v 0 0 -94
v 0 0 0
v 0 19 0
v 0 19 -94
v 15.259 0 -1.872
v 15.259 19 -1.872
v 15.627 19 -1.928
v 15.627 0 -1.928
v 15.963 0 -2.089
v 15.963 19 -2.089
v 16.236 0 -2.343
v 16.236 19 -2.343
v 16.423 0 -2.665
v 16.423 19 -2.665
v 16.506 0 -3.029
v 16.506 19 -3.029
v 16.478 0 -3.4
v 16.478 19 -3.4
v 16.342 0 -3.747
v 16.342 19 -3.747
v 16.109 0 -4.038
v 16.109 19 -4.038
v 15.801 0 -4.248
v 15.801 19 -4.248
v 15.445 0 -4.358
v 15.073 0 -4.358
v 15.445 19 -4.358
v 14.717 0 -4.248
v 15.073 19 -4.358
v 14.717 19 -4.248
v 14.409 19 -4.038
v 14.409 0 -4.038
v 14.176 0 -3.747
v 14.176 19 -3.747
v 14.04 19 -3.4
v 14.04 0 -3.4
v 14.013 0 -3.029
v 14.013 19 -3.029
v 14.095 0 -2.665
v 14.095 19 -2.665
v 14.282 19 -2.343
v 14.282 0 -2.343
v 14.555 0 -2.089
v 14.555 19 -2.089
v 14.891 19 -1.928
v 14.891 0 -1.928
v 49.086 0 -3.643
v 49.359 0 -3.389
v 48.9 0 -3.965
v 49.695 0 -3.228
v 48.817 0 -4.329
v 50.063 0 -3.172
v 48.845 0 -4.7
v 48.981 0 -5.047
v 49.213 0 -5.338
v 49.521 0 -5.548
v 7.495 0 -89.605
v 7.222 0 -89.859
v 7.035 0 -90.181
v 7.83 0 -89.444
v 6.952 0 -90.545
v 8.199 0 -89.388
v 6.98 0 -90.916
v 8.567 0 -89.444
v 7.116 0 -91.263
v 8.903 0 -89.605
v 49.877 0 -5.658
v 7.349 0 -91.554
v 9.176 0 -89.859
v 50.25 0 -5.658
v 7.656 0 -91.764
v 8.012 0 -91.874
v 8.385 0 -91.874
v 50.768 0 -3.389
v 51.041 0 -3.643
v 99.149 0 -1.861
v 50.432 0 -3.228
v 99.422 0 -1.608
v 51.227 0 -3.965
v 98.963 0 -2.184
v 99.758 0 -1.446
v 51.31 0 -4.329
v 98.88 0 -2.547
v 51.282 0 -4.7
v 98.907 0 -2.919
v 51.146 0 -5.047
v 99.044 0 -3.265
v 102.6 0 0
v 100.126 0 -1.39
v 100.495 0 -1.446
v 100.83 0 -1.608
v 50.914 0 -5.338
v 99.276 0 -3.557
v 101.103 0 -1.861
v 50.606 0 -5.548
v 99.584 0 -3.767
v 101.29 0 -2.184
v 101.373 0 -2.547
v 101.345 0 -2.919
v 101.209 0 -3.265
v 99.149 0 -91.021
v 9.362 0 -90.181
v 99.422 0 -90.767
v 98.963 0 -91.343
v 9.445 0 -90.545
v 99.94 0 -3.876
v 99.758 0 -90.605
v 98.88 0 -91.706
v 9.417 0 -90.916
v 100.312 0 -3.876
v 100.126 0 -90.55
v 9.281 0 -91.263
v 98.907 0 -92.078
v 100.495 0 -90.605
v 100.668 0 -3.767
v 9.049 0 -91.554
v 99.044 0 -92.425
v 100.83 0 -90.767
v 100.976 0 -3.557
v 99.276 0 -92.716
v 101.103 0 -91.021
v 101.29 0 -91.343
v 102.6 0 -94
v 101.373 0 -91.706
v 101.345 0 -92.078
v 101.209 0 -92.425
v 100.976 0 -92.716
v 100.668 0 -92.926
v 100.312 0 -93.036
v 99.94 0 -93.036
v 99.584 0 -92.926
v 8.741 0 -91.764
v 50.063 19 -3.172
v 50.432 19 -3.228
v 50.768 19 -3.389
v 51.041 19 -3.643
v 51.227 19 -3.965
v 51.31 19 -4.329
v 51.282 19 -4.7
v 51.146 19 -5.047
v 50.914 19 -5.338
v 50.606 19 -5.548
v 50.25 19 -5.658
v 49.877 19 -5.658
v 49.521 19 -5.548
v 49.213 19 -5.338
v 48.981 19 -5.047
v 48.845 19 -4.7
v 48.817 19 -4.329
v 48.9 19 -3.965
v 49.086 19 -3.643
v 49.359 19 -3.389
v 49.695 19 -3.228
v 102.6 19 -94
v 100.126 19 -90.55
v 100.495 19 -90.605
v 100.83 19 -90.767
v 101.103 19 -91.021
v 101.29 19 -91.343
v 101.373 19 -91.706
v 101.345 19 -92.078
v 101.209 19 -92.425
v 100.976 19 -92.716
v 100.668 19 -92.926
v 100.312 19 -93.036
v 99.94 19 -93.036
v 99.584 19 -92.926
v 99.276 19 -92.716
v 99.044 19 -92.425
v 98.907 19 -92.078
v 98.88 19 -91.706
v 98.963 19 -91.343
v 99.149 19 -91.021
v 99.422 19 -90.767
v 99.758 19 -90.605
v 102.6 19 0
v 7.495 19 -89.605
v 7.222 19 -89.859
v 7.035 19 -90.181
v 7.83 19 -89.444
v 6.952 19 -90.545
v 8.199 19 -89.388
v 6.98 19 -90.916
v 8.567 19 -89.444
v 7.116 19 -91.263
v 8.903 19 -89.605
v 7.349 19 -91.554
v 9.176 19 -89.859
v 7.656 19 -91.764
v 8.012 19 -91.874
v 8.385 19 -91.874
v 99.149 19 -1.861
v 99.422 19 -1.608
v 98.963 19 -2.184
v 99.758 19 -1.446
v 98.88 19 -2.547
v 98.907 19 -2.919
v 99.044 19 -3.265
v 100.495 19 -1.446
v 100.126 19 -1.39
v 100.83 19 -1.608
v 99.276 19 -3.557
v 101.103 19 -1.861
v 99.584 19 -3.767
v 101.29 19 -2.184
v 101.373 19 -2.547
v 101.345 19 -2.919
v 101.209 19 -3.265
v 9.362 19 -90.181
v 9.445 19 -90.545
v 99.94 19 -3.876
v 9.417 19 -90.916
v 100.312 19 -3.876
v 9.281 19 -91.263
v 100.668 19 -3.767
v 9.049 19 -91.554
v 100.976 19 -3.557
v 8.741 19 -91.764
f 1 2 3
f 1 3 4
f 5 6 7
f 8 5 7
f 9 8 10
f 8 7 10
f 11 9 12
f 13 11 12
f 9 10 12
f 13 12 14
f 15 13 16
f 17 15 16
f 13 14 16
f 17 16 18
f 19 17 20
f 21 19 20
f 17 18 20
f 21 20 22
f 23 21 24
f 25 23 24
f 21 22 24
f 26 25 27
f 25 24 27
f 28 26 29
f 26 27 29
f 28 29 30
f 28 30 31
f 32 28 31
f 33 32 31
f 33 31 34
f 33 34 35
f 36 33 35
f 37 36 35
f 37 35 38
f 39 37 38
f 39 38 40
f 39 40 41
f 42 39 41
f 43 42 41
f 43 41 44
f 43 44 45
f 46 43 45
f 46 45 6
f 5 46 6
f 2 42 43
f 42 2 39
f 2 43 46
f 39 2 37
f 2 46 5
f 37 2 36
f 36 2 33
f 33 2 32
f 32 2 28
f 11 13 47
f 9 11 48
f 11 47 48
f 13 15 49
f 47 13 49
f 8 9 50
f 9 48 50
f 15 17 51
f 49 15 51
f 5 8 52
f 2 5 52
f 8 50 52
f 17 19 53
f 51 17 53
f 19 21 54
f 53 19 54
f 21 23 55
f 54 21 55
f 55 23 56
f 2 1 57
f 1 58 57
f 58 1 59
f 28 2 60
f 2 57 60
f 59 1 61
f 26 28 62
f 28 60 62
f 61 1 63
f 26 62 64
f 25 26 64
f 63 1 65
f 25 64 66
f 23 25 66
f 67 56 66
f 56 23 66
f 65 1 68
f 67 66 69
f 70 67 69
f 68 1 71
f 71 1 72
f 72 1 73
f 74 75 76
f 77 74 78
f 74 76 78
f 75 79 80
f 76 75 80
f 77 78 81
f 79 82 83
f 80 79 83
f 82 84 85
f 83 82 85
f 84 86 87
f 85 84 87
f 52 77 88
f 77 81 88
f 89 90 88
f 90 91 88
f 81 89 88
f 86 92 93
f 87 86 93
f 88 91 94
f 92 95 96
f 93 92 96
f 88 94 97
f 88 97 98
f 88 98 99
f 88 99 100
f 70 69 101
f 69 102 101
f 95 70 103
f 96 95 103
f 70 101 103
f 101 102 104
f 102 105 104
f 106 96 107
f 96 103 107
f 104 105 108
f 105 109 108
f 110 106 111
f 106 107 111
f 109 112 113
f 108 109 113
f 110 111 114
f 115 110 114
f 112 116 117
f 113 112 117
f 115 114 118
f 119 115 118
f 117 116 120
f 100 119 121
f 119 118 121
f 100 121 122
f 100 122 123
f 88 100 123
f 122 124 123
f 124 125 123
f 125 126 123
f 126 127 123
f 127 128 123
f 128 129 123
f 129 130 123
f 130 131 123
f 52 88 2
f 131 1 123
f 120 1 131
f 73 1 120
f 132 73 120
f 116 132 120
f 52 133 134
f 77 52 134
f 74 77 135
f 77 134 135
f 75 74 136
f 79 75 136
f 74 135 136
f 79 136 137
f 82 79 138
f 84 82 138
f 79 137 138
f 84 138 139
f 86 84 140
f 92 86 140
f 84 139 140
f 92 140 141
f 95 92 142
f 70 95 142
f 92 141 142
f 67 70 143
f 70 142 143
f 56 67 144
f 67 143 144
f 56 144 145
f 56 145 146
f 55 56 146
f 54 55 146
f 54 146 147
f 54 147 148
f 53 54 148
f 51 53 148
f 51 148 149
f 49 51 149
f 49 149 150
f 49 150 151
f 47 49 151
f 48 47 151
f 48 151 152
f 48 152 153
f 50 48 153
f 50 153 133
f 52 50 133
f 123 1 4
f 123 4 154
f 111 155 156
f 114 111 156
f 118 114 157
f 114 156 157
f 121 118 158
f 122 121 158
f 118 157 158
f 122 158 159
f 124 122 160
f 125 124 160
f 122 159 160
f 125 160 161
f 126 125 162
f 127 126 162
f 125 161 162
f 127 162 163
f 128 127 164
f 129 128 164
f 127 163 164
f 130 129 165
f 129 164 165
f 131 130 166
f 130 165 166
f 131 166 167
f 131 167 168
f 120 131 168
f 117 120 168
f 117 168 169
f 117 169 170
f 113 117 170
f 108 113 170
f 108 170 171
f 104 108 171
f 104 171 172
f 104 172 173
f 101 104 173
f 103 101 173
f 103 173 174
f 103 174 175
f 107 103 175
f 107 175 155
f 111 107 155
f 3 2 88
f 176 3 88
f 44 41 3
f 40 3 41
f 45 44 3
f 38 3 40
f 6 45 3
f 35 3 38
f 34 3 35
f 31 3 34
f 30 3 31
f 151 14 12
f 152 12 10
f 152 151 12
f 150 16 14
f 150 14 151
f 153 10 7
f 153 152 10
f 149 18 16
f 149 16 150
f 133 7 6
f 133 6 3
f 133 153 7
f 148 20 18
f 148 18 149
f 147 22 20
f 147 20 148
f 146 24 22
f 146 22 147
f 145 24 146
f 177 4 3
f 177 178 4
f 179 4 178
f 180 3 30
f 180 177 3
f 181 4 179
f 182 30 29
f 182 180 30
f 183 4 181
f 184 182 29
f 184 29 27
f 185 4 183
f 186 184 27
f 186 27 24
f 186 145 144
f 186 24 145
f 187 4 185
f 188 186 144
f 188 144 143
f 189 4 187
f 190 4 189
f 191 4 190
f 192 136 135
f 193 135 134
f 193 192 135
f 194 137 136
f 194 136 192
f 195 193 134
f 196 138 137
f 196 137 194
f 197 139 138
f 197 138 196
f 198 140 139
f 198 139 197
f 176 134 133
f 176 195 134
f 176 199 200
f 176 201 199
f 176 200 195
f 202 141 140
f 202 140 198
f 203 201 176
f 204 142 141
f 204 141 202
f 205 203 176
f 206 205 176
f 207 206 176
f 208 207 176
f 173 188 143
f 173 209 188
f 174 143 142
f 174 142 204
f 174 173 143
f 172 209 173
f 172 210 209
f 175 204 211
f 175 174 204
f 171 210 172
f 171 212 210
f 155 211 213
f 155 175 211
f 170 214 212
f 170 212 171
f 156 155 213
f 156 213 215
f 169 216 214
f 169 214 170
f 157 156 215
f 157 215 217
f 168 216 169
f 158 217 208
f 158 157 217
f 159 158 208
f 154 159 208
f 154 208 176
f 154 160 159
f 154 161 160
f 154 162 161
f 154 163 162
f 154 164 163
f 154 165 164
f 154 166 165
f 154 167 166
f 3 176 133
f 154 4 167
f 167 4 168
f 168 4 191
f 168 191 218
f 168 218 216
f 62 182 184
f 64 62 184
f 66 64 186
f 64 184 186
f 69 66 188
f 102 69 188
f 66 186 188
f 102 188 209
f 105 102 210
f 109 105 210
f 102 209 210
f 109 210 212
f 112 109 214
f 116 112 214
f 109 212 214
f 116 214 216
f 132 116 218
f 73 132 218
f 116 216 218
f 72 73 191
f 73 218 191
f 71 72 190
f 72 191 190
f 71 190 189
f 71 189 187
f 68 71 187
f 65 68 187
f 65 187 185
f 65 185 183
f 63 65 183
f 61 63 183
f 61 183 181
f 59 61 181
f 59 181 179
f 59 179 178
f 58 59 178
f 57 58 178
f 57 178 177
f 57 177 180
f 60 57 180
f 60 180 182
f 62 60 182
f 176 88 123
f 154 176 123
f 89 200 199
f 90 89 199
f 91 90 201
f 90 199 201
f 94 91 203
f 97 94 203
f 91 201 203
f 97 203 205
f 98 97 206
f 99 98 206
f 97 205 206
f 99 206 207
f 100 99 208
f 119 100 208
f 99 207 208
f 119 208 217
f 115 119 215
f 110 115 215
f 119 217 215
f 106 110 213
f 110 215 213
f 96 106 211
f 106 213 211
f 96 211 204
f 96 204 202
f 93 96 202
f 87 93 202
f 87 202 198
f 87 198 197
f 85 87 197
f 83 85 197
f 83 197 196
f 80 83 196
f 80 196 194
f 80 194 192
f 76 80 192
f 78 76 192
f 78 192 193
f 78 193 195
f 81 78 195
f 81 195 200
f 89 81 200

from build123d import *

# Parameters (mm, degrees)
ESQUISSE1_W             = 102.6
ESQUISSE1_H             = 94
BOSS_EXTRU_1_DEPTH      = 19
ESQUISSE2_R             = 1.25
ENL_V_MAT_EXTRU_1_DEPTH = 141.441304466


with BuildPart() as part:
    # Esquisse1 → Boss.-Extru.1 (new body)
    with BuildSketch(Plane(origin=(0, 0, 0), x_dir=(1, 0, 0), z_dir=(0, 1, 0))):
        with Locations((51.3, 47)):
            Rectangle(ESQUISSE1_W, ESQUISSE1_H)
    extrude(amount=BOSS_EXTRU_1_DEPTH)

    # Esquisse2 → Enlèv. mat.-Extru.1 (cut, through all)
    with BuildSketch(Plane(origin=(0, 19, 0), x_dir=(1, 0, 0), z_dir=(0, 1, 0))):
        with Locations(Location((8.19879565, 90.638127074, 0), (0, 0, 270))):
            Circle(ESQUISSE2_R)
        with Locations(Location((100.126132376, 91.799894843, 0), (0, 0, 270))):
            Circle(ESQUISSE2_R)
        with Locations(Location((100.126132376, 2.640418581, 0), (0, 0, 270))):
            Circle(ESQUISSE2_R)
        with Locations(Location((50.06348936, 4.422062011, 0), (0, 0, 270))):
            Circle(ESQUISSE2_R)
        with Locations(Location((15.259017819, 3.122110717, 0), (0, 0, 270))):
            Circle(ESQUISSE2_R)
    extrude(amount=-ENL_V_MAT_EXTRU_1_DEPTH, mode=Mode.SUBTRACT)


solid = part.part
